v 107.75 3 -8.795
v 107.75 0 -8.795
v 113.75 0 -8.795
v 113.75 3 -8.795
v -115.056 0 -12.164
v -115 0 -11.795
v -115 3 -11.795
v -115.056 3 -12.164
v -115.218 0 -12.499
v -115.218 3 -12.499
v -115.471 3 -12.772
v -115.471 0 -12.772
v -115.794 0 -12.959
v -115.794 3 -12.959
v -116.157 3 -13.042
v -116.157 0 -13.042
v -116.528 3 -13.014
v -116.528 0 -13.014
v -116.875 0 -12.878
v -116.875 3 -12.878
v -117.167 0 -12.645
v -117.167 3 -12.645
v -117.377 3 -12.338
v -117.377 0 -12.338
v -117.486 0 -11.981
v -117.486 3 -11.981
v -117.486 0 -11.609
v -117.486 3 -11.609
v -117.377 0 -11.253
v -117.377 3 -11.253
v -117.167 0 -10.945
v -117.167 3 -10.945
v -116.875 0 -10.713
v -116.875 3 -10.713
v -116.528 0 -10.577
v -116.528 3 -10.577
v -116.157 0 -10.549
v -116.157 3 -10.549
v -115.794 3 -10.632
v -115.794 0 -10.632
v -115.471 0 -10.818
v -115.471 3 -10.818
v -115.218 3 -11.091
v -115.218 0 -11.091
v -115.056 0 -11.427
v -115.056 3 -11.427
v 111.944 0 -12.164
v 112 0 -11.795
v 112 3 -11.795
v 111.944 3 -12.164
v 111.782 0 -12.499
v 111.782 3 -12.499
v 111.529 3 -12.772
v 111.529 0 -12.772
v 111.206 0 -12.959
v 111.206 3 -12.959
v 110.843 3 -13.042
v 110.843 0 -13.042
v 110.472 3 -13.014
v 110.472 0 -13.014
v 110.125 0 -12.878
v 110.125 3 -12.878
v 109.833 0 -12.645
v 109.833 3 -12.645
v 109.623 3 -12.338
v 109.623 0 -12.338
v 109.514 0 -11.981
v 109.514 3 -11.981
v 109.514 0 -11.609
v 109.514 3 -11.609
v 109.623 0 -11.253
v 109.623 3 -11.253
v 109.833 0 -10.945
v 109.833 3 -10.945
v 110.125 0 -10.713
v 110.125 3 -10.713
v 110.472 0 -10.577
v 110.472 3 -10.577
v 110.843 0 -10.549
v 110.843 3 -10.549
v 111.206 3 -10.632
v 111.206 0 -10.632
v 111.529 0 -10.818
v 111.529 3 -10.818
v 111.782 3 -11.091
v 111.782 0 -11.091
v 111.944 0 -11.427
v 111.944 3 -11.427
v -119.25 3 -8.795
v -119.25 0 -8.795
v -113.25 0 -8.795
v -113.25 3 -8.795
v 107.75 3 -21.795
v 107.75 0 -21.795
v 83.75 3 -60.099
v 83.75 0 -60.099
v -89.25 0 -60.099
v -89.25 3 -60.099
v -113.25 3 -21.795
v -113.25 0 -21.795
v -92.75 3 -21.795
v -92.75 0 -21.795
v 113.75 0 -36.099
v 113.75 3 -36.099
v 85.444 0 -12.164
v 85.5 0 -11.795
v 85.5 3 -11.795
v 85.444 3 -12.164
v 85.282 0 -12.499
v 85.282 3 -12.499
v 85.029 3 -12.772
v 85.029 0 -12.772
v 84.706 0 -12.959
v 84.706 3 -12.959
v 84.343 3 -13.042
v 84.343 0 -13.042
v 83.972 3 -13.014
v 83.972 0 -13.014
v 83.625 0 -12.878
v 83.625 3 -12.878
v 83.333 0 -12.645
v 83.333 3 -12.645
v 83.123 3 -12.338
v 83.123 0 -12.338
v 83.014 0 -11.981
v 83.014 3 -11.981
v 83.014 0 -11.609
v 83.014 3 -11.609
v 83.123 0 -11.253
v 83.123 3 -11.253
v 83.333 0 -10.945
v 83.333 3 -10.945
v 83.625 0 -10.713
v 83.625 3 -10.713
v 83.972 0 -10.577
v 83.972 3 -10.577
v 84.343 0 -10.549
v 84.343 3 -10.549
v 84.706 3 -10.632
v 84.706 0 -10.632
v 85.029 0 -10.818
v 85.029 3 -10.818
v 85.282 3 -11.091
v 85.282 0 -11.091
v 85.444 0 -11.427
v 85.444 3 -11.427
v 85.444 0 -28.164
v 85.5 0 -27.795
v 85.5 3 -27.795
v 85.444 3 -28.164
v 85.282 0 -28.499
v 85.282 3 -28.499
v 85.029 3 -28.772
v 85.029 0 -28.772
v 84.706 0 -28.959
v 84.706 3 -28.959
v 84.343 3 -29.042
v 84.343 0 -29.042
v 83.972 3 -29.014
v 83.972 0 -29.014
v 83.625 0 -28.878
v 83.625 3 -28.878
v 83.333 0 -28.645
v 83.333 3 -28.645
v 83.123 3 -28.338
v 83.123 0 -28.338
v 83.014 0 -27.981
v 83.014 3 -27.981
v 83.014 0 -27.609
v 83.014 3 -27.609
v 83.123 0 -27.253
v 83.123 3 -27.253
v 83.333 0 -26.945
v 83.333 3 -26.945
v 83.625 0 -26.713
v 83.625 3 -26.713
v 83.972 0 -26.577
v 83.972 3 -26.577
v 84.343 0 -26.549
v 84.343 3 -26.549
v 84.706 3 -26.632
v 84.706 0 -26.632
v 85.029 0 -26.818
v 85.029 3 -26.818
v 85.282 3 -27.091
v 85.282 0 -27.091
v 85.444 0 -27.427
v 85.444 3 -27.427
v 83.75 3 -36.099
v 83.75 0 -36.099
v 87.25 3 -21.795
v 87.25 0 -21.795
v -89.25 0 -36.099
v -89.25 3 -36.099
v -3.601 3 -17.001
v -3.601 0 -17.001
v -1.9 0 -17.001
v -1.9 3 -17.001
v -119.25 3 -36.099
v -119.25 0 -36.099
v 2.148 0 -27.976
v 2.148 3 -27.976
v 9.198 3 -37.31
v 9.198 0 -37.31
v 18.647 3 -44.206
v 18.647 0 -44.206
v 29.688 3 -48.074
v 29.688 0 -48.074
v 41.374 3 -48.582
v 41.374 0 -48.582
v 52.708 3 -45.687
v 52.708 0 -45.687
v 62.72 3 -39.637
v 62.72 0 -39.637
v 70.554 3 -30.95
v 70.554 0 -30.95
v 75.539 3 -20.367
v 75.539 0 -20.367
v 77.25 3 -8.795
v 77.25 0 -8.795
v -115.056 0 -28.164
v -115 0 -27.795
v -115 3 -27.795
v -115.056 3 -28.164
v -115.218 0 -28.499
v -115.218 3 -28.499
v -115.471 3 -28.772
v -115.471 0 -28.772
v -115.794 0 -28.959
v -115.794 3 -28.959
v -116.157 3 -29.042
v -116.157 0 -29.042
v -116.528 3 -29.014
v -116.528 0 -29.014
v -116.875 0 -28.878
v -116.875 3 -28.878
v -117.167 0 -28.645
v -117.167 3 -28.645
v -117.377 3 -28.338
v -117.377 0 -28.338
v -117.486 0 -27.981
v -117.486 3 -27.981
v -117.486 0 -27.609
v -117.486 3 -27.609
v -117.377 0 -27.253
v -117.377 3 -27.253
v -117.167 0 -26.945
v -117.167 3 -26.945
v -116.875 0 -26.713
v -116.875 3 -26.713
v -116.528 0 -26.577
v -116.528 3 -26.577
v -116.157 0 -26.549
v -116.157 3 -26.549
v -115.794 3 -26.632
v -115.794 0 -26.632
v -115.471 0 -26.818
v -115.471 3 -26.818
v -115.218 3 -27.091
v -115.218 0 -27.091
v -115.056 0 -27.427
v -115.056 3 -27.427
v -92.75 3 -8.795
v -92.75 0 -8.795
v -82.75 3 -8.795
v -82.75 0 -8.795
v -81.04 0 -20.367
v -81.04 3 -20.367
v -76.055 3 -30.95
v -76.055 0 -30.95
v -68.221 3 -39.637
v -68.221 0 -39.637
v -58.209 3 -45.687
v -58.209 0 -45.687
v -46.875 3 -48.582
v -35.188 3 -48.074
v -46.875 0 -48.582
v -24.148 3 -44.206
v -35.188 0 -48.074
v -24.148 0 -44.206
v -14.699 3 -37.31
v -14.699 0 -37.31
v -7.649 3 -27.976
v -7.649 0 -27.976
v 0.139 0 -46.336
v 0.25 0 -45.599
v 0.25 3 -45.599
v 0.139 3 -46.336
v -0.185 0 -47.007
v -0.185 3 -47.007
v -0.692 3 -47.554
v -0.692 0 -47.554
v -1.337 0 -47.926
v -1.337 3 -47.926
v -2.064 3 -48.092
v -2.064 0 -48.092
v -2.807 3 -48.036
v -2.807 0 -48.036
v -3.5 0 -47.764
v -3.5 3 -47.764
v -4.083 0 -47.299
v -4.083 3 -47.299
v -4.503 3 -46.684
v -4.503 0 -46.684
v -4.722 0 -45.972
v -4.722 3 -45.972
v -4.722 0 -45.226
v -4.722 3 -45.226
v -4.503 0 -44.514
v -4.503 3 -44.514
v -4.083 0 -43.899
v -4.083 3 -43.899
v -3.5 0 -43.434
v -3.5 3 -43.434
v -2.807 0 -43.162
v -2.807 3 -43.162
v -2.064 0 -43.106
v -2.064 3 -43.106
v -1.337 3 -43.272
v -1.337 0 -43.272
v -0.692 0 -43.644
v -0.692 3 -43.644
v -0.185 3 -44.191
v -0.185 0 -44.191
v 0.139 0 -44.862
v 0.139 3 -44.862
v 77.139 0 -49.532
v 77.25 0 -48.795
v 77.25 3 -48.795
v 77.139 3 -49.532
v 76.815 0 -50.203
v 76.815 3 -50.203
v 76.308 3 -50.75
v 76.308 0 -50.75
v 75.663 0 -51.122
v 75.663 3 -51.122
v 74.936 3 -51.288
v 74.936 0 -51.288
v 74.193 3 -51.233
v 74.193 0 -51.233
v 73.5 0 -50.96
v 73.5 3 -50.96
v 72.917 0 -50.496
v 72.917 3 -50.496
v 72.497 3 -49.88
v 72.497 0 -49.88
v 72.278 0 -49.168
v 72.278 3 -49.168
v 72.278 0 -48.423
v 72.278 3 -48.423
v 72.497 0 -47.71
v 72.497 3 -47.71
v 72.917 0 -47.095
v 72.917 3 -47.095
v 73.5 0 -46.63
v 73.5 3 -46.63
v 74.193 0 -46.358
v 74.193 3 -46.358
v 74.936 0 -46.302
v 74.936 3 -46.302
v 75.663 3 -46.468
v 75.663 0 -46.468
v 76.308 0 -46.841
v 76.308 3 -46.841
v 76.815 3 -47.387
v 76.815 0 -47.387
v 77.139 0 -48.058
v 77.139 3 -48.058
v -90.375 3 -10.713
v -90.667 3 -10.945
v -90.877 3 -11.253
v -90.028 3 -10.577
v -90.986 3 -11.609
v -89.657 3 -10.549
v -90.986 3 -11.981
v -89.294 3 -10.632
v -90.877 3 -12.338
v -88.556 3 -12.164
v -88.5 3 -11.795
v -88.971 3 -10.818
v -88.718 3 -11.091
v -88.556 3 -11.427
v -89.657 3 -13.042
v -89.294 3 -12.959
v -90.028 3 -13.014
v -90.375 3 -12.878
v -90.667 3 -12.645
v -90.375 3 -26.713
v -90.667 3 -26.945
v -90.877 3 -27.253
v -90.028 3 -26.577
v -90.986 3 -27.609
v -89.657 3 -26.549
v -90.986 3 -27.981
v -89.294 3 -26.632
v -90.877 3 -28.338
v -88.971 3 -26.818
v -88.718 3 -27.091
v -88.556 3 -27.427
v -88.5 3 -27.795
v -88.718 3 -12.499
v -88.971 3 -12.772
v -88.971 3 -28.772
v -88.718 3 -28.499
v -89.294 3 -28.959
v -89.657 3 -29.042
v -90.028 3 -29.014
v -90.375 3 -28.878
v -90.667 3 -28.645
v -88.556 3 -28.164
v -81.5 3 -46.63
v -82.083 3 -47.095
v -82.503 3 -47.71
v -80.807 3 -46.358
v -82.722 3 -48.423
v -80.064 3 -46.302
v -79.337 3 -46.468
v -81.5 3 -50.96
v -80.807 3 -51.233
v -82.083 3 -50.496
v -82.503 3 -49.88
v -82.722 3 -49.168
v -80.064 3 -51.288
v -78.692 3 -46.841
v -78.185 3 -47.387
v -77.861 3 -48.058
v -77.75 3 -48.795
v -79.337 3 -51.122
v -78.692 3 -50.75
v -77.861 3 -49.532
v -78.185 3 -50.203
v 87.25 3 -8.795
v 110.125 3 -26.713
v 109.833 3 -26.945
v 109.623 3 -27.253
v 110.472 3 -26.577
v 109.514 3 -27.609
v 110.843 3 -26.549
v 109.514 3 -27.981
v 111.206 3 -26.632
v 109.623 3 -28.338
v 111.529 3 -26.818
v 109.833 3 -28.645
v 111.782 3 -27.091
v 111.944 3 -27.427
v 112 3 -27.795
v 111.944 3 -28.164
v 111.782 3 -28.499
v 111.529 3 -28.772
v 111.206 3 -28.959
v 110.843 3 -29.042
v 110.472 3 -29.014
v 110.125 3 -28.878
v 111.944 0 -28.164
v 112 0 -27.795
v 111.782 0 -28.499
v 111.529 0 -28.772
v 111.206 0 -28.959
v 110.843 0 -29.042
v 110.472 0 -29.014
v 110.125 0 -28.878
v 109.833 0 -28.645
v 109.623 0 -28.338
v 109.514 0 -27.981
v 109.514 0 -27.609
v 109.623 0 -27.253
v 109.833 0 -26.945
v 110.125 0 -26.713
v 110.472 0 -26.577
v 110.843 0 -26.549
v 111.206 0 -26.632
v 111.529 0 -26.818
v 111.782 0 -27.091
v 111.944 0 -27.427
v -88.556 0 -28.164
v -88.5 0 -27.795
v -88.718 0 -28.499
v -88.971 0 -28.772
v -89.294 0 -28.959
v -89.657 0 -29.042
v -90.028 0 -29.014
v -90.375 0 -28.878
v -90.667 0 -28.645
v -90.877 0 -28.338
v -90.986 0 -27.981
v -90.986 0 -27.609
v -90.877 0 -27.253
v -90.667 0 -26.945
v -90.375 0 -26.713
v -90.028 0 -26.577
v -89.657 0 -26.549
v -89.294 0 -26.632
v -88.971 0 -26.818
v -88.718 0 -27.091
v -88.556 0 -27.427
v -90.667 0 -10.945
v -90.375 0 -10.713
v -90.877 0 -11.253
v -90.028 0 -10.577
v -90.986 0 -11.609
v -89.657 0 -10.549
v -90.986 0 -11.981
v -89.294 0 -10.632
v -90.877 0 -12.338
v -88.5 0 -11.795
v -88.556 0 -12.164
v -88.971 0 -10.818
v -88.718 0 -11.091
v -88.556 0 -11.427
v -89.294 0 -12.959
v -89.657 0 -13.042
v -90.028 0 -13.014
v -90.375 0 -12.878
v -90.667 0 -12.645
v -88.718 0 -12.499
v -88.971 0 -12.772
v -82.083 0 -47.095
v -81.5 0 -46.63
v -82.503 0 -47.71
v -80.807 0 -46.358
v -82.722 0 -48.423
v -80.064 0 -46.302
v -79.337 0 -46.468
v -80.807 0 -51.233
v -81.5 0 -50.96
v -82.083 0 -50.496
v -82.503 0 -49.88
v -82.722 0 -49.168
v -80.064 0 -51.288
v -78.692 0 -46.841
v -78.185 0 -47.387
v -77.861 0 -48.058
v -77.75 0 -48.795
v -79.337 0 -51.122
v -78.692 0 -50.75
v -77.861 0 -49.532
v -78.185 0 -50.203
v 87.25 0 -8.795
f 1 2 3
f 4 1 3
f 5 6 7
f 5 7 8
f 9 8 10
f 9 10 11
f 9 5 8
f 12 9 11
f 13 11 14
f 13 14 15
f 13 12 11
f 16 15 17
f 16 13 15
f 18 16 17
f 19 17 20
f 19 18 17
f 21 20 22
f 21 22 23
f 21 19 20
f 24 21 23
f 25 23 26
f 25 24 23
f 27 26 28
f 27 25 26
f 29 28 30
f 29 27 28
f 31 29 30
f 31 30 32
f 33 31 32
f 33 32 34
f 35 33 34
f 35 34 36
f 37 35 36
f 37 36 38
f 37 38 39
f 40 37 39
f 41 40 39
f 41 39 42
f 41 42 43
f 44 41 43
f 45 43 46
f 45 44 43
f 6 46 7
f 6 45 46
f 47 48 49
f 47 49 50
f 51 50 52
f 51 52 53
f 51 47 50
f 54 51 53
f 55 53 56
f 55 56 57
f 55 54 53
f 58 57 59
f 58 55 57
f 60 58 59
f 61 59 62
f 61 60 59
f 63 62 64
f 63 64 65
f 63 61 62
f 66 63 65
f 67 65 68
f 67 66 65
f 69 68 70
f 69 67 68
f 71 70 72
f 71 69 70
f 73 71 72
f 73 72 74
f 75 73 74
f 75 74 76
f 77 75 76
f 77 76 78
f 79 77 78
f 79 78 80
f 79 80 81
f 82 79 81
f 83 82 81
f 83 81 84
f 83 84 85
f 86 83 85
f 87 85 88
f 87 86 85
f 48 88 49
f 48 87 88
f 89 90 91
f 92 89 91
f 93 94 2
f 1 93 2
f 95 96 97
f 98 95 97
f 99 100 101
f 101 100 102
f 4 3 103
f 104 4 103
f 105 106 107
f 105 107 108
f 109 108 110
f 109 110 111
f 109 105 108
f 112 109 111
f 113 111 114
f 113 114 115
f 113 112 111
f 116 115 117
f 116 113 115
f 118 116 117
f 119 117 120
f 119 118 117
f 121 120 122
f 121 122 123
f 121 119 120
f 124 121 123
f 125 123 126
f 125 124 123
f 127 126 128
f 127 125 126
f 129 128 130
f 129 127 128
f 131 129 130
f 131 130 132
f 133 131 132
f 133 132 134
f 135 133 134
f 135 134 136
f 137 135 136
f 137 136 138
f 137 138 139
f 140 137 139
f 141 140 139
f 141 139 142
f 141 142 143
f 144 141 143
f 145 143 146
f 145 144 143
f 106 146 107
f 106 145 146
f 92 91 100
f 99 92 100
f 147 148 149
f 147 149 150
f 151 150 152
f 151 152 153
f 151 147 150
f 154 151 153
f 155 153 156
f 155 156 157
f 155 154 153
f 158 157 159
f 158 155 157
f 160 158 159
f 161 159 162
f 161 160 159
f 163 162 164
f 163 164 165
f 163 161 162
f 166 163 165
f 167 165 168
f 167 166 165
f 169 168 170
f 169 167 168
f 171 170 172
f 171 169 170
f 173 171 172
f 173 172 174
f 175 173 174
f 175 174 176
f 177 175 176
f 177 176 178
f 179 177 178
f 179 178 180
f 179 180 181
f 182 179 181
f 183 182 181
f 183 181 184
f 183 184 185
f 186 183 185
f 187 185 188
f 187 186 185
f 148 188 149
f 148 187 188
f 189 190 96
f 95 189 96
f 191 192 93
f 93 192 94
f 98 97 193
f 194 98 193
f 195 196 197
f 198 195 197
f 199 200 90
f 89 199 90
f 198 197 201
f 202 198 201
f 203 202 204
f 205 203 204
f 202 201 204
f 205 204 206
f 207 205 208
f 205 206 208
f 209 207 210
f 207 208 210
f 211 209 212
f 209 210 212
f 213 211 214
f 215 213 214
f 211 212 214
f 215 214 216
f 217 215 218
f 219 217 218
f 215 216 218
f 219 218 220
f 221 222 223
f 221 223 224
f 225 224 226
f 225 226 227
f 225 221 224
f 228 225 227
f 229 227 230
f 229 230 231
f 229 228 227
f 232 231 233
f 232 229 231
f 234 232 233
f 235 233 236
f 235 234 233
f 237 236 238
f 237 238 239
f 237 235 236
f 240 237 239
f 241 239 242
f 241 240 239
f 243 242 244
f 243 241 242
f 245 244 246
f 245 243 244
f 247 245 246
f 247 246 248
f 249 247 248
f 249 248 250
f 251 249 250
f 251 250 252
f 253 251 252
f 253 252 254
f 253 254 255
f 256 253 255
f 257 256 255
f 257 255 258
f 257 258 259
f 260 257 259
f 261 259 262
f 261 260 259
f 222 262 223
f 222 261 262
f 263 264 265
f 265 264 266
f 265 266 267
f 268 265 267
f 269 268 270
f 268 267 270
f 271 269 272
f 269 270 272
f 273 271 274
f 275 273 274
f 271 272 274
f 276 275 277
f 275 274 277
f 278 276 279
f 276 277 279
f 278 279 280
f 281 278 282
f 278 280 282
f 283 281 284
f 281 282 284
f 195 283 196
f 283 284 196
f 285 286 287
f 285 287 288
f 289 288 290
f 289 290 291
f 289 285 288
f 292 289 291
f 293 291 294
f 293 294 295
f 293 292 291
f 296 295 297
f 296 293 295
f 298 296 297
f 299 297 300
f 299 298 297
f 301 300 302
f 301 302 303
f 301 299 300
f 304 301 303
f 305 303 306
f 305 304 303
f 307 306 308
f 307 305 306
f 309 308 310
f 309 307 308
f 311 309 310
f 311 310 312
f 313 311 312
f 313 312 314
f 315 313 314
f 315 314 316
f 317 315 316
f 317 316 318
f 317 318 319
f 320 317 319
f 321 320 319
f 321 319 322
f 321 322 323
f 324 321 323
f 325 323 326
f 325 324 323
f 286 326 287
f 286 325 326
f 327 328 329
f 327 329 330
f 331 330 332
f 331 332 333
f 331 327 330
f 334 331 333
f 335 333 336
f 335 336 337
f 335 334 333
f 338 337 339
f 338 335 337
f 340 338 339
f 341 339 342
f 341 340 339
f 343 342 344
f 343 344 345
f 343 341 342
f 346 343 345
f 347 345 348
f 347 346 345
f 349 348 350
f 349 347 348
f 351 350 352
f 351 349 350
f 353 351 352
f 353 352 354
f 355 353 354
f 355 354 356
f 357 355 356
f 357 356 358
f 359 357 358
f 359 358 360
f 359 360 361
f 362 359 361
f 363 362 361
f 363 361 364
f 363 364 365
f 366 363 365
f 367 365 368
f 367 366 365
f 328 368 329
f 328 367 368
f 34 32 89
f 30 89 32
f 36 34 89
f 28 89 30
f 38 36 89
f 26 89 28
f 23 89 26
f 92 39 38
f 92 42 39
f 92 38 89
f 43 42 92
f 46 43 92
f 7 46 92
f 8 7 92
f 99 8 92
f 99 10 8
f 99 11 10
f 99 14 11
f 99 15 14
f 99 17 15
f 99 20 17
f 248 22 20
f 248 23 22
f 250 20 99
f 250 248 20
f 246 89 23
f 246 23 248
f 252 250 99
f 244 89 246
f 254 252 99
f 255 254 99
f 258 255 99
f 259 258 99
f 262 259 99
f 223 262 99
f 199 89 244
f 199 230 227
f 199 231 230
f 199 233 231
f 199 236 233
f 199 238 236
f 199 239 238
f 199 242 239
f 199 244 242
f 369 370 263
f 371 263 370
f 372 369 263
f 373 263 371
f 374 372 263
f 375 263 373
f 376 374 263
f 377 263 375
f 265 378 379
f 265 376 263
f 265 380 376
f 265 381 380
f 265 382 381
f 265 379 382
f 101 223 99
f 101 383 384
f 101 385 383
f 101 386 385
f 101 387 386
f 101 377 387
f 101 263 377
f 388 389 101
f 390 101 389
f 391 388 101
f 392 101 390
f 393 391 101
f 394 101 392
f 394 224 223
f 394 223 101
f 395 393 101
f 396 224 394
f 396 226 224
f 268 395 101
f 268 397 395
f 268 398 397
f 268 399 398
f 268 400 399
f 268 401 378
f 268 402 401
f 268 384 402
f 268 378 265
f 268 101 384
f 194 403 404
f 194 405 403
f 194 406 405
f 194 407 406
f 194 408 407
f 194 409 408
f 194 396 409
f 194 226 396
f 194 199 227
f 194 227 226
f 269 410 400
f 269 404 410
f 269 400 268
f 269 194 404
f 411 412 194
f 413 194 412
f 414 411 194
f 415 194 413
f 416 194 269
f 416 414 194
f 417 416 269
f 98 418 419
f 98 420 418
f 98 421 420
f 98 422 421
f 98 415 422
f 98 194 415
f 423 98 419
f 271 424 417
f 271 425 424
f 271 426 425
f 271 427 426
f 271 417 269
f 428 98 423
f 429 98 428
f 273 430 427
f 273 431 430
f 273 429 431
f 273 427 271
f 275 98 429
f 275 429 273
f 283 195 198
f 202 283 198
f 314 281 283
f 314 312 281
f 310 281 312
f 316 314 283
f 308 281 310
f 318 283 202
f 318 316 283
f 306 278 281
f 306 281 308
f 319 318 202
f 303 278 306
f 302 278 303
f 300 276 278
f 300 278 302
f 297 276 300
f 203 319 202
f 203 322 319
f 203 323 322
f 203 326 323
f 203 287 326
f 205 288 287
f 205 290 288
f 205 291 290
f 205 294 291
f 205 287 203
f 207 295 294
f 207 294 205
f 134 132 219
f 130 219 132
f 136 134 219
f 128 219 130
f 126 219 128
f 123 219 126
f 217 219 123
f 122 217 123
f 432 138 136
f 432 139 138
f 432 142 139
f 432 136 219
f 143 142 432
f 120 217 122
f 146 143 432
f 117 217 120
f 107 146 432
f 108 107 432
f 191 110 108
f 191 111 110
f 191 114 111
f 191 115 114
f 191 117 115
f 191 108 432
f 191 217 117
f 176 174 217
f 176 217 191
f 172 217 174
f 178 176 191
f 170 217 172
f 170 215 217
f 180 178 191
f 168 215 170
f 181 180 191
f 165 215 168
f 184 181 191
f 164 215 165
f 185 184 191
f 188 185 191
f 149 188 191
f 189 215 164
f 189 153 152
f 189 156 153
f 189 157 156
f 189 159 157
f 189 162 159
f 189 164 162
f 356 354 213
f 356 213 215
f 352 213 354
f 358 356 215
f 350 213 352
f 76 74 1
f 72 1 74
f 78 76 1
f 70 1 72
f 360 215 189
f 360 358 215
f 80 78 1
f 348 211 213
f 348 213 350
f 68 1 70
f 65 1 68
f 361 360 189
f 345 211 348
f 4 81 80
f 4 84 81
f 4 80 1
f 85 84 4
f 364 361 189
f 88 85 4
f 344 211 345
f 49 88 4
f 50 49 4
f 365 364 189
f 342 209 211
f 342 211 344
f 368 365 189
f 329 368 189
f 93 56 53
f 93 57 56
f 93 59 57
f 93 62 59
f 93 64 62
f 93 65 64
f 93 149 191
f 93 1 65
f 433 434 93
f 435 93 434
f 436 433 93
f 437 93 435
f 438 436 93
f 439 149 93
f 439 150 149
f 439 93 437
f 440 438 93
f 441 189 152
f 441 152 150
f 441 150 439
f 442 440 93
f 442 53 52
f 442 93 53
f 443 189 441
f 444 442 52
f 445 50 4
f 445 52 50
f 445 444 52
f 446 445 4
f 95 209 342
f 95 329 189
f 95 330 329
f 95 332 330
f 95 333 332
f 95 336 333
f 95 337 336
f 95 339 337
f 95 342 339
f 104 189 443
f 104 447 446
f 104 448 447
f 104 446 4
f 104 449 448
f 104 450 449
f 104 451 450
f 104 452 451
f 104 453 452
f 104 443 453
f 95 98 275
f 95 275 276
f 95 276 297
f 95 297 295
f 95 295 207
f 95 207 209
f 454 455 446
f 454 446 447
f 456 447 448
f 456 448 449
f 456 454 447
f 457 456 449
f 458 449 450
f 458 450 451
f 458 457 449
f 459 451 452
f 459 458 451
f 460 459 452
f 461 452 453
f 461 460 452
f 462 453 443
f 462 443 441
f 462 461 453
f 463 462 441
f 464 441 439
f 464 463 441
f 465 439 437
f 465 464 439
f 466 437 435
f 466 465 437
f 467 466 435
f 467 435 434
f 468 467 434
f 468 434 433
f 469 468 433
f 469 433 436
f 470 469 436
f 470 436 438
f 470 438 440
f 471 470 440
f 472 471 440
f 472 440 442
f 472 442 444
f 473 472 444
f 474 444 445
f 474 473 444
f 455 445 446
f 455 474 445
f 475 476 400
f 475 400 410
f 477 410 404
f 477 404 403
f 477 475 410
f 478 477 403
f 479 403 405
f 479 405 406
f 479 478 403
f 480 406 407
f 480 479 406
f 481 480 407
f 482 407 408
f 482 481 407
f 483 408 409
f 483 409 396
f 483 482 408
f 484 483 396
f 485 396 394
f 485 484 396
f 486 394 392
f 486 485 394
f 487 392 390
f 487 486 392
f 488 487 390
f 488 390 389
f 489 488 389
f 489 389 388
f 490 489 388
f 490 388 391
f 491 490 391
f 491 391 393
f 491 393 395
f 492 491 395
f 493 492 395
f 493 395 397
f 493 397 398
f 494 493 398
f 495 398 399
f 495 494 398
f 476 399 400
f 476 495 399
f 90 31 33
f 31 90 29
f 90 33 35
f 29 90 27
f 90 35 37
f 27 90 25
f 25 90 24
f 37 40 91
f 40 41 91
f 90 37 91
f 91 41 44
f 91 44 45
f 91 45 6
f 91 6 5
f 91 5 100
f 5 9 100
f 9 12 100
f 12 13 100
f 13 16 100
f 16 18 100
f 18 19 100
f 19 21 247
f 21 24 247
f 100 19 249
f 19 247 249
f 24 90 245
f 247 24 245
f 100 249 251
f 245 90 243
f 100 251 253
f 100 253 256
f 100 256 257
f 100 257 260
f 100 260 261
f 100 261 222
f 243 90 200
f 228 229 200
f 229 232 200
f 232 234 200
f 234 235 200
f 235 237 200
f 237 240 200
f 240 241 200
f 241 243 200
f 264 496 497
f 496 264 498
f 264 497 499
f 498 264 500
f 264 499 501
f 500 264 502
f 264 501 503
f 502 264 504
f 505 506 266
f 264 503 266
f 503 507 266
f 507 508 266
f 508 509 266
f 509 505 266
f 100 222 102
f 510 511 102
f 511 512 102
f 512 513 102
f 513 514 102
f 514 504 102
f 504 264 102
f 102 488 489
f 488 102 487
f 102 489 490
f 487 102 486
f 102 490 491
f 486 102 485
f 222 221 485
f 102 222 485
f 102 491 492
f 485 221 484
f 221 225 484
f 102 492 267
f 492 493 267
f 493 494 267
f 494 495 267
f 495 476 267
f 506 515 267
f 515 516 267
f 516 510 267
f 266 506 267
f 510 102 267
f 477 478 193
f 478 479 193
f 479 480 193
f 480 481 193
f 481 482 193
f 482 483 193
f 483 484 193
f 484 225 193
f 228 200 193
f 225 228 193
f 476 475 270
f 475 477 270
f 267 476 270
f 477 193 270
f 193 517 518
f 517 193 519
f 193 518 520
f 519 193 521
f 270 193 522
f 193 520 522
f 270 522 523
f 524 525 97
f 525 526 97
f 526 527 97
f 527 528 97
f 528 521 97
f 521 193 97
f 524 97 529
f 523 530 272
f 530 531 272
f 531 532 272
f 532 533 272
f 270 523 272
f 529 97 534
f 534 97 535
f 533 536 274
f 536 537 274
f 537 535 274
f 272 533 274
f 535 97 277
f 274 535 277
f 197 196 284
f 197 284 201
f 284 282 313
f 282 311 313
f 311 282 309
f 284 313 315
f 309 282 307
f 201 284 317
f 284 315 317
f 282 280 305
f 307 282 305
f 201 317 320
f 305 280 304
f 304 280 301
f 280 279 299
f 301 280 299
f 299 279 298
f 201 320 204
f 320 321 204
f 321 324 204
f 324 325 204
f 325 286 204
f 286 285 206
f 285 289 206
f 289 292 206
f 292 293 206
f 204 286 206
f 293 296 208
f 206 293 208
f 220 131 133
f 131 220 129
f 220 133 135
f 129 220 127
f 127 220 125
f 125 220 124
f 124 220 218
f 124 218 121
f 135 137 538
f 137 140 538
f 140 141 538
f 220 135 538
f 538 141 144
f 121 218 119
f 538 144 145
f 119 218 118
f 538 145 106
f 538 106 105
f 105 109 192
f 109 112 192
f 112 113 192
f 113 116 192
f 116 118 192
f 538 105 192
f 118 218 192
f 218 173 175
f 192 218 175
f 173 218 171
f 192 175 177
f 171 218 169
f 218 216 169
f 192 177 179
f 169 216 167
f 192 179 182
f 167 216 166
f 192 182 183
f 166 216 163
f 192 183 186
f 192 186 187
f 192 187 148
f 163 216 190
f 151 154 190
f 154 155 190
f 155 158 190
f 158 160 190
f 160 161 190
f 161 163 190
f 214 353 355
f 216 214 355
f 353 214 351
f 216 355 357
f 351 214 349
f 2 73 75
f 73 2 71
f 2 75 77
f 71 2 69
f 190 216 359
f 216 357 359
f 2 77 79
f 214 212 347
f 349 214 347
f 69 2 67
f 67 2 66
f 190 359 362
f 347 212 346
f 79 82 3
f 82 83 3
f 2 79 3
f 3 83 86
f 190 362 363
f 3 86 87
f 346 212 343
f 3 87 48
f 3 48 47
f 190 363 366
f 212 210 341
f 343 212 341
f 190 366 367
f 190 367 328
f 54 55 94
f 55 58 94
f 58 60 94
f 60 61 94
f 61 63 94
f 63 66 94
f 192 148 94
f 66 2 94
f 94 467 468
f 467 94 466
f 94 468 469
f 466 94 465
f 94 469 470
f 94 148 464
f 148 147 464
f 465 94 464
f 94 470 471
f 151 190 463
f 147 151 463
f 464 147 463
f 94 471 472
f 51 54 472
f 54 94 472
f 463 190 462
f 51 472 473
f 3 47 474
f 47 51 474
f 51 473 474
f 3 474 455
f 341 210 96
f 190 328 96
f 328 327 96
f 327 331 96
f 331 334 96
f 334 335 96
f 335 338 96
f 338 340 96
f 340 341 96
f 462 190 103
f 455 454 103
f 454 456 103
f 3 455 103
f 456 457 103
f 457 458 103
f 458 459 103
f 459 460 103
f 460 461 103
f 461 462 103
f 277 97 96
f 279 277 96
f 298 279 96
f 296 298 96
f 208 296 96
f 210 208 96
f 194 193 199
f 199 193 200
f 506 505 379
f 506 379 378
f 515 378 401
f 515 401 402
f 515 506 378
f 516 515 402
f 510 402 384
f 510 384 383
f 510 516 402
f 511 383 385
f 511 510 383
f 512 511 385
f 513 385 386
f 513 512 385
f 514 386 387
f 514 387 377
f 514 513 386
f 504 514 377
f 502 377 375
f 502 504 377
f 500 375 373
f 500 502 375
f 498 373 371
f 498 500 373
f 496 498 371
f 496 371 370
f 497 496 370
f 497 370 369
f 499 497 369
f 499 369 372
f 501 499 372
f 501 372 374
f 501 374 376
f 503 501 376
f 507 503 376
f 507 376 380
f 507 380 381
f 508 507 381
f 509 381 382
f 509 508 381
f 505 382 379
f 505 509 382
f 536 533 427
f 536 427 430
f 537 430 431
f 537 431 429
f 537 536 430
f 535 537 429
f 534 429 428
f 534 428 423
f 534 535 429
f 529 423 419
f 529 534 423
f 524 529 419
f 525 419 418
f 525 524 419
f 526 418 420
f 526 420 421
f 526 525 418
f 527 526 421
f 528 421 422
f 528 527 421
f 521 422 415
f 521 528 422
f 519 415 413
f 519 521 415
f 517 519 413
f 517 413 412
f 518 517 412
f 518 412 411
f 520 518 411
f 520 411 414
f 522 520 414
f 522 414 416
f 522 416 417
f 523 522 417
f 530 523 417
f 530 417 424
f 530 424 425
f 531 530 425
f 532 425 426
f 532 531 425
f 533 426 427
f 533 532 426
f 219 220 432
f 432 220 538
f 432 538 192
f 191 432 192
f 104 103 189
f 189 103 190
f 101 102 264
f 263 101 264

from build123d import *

# Parameters (mm, degrees)
ESQUISSE1_R      = 1.25
ESQUISSE1_R_2    = 2.5
EXTRUSION1_DEPTH = 3


with BuildPart() as part:
    # Esquisse1 → Extrusion1 (new body)
    with BuildSketch(Plane(origin=(0, 0, 0), x_dir=(1, 0, 0), z_dir=(0, 1, 0))):
        with BuildLine():
            Line((-119.250326512, 8.795182269), (-113.250326512, 8.795182269))
            Line((-113.250326512, 8.795182269), (-113.250326512, 21.795182269))
            Line((-113.250326512, 21.795182269), (-92.750326512, 21.795182269))
            Line((-92.750326512, 21.795182269), (-92.750326512, 8.795182269))
            Line((-92.750326512, 8.795182269), (-82.750326512, 8.795182269))
            ThreePointArc((-82.750326512, 8.795182269), (-46.875027378, 48.581949451), (-3.600984374, 17.000607921))
            Line((-3.600984374, 17.000607921), (-1.899668651, 17.000607921))
            ThreePointArc((-1.899668651, 17.000607921), (41.374374353, 48.581949451), (77.249673488, 8.795182269))
            Line((77.249673488, 8.795182269), (87.249673488, 8.795182269))
            Line((87.249673488, 8.795182269), (87.249673488, 21.795182269))
            Line((87.249673488, 21.795182269), (107.749673488, 21.795182269))
            Line((107.749673488, 21.795182269), (107.749673488, 8.795182269))
            Line((107.749673488, 8.795182269), (113.749673488, 8.795182269))
            Line((113.749673488, 8.795182269), (113.749673488, 36.099018287))
            Line((113.749673488, 36.099018287), (83.749673488, 36.099018287))
            Line((83.749673488, 36.099018287), (83.749673488, 60.099018287))
            Line((83.749673488, 60.099018287), (-89.250326512, 60.099018287))
            Line((-89.250326512, 60.099018287), (-89.250326512, 36.099018287))
            Line((-89.250326512, 36.099018287), (-119.250326512, 36.099018287))
            Line((-119.250326512, 36.099018287), (-119.250326512, 8.795182269))
        make_face()
        with Locations((110.749673488, 11.795182269)):
            Circle(ESQUISSE1_R, mode=Mode.SUBTRACT)
        with Locations((-2.250326512, 45.599018287)):
            Circle(ESQUISSE1_R_2, mode=Mode.SUBTRACT)
        with Locations((84.249673488, 27.795182269)):
            Circle(ESQUISSE1_R, mode=Mode.SUBTRACT)
        with Locations((110.749673488, 27.795182269)):
            Circle(ESQUISSE1_R, mode=Mode.SUBTRACT)
        with Locations((-80.250326512, 48.795182269)):
            Circle(ESQUISSE1_R_2, mode=Mode.SUBTRACT)
        with Locations((74.749673488, 48.795182269)):
            Circle(ESQUISSE1_R_2, mode=Mode.SUBTRACT)
        with Locations((-116.250326512, 27.795182269)):
            Circle(ESQUISSE1_R, mode=Mode.SUBTRACT)
        with Locations((-89.750326512, 27.795182269)):
            Circle(ESQUISSE1_R, mode=Mode.SUBTRACT)
        with Locations((-89.750326512, 11.795182269)):
            Circle(ESQUISSE1_R, mode=Mode.SUBTRACT)
        with Locations((84.249673488, 11.795182269)):
            Circle(ESQUISSE1_R, mode=Mode.SUBTRACT)
        with Locations((-116.250326512, 11.795182269)):
            Circle(ESQUISSE1_R, mode=Mode.SUBTRACT)
    extrude(amount=EXTRUSION1_DEPTH)


solid = part.part
